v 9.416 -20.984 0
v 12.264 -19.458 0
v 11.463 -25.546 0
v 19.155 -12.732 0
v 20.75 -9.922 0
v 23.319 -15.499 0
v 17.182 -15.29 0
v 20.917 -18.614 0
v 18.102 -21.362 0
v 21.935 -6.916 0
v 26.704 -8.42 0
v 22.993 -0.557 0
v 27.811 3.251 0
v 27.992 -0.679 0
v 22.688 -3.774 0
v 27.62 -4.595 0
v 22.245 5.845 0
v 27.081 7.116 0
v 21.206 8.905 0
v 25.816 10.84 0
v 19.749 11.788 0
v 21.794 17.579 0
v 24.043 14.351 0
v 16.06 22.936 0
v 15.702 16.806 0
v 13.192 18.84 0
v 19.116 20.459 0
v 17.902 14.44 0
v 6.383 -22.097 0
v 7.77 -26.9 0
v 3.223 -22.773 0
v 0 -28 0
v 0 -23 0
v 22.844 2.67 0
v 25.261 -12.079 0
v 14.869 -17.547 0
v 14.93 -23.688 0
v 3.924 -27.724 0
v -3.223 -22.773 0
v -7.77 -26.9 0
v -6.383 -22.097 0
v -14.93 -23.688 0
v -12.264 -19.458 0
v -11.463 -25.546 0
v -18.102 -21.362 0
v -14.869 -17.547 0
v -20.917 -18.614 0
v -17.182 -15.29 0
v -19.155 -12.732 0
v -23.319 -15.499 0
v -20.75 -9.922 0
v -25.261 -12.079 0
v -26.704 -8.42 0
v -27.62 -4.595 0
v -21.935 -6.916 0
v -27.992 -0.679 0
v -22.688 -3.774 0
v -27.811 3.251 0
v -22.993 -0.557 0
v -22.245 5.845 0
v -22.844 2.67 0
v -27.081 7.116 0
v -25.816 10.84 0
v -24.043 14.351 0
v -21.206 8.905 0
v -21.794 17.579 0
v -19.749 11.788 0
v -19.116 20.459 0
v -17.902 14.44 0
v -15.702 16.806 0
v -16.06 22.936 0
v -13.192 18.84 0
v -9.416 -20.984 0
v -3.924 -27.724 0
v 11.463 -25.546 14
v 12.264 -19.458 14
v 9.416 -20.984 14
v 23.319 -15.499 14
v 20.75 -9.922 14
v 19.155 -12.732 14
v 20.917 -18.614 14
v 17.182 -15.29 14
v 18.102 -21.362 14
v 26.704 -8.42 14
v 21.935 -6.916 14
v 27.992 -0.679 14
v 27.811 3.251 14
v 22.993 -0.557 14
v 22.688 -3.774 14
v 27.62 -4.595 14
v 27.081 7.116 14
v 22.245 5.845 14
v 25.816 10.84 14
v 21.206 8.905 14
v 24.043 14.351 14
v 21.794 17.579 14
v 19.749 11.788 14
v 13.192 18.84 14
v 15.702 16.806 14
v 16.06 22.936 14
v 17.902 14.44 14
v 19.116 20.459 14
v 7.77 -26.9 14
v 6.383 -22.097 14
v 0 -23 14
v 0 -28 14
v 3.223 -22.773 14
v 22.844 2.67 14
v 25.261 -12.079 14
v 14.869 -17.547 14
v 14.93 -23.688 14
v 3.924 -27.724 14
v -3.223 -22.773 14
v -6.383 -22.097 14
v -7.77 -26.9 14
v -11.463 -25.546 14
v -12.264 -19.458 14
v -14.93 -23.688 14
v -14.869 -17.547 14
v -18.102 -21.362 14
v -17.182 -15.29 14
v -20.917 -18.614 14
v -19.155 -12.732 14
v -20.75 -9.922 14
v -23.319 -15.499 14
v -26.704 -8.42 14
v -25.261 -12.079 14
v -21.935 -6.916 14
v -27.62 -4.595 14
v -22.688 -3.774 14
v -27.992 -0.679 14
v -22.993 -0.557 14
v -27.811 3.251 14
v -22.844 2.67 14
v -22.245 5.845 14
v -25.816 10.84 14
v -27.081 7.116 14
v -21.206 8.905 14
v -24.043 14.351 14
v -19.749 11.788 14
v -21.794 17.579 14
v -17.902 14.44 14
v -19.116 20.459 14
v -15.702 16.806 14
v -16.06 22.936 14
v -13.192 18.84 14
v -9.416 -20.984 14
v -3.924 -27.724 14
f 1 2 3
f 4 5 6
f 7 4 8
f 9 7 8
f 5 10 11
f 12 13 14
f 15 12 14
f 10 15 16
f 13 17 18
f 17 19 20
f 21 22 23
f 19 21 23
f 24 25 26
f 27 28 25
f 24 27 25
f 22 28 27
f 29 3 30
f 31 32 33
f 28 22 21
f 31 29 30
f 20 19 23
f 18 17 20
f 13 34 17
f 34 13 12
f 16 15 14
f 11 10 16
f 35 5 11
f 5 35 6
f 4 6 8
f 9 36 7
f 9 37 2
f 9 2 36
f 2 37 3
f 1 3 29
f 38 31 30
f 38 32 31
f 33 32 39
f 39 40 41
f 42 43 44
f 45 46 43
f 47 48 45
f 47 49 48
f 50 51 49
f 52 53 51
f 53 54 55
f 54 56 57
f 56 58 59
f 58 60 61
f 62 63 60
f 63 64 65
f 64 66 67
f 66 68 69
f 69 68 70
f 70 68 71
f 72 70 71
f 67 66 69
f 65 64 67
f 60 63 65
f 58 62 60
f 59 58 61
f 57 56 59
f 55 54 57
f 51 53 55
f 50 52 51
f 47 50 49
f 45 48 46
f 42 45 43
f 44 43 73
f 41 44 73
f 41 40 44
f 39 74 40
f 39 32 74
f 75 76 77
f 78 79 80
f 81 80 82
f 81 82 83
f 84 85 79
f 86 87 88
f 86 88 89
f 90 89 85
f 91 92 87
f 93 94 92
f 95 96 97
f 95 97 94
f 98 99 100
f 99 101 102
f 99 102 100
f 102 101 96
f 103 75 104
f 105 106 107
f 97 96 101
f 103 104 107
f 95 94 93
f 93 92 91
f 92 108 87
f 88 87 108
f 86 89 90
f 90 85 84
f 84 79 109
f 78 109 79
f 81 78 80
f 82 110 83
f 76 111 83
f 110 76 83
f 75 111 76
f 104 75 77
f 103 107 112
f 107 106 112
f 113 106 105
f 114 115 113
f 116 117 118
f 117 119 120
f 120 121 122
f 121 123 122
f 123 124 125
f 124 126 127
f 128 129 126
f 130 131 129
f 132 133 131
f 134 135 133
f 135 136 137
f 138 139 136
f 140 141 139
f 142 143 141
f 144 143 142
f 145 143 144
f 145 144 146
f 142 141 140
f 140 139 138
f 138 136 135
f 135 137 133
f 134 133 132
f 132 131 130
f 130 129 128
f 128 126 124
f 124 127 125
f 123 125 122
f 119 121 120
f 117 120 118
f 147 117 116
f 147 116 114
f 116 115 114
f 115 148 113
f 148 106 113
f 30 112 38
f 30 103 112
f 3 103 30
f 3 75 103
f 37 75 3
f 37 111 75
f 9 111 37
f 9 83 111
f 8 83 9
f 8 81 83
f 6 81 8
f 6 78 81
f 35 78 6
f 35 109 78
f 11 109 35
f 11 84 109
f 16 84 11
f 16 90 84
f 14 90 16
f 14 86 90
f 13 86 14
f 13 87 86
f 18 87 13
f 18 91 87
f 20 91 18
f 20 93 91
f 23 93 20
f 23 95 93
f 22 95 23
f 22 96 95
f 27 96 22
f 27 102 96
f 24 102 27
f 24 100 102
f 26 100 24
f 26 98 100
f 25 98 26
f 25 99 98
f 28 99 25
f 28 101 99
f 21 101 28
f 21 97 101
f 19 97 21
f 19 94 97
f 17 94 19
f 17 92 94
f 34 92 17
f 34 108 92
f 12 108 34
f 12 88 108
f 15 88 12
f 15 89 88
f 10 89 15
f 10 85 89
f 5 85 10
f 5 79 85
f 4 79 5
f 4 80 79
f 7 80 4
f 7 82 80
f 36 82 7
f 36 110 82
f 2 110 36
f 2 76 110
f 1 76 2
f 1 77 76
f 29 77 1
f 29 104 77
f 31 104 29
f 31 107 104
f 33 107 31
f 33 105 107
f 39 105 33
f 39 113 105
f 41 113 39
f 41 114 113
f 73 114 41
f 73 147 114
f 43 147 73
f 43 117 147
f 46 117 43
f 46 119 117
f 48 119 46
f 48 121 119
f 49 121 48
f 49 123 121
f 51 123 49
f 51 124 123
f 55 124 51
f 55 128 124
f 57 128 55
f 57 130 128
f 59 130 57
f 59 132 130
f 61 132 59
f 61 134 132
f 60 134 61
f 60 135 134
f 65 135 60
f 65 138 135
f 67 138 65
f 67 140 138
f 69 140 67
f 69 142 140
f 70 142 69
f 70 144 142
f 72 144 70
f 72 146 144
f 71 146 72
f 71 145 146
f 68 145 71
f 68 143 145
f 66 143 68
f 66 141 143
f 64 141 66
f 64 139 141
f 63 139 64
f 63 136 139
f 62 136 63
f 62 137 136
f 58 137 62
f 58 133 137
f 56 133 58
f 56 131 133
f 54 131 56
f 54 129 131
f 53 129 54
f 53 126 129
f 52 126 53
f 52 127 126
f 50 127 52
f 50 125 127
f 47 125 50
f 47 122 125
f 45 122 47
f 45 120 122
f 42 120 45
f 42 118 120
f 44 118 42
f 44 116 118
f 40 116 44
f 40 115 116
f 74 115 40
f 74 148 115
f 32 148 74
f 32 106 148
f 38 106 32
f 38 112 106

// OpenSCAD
$fn = 32;

// ----------------------------------------------------------------------
// Spring clip: 56 mm outside, 5 mm band, 70 degree opening
// ----------------------------------------------------------------------

// --- parameters (mm) ---
outer_r = 28;             // clip outside radius
inner_r = 23;             // clip bore radius
band = 5;                 // band thickness
clip_w = 14;              // clip width
opening = 70;             // opening angle

clip_profile = [[-16.06, 22.936], [-19.116, 20.459], [-21.794, 17.579], [-24.043, 14.351], [-25.816, 10.84], [-27.081, 7.116], [-27.811, 3.251], [-27.992, -0.679], [-27.62, -4.595], [-26.704, -8.42], [-25.261, -12.079], [-23.319, -15.499], [-20.917, -18.614], [-18.102, -21.362], [-14.93, -23.688], [-11.463, -25.546], [-7.77, -26.9], [-3.924, -27.724], [0, -28], [3.924, -27.724], [7.77, -26.9], [11.463, -25.546], [14.93, -23.688], [18.102, -21.362], [20.917, -18.614], [23.319, -15.499], [25.261, -12.079], [26.704, -8.42], [27.62, -4.595], [27.992, -0.679], [27.811, 3.251], [27.081, 7.116], [25.816, 10.84], [24.043, 14.351], [21.794, 17.579], [19.116, 20.459], [16.06, 22.936], [13.192, 18.84], [15.702, 16.806], [17.902, 14.44], [19.749, 11.788], [21.206, 8.905], [22.245, 5.845], [22.844, 2.67], [22.993, -0.557], [22.688, -3.774], [21.935, -6.916], [20.75, -9.922], [19.155, -12.732], [17.182, -15.29], [14.869, -17.547], [12.264, -19.458], [9.416, -20.984], [6.383, -22.097], [3.223, -22.773], [0, -23], [-3.223, -22.773], [-6.383, -22.097], [-9.416, -20.984], [-12.264, -19.458], [-14.869, -17.547], [-17.182, -15.29], [-19.155, -12.732], [-20.75, -9.922], [-21.935, -6.916], [-22.688, -3.774], [-22.993, -0.557], [-22.844, 2.67], [-22.245, 5.845], [-21.206, 8.905], [-19.749, 11.788], [-17.902, 14.44], [-15.702, 16.806], [-13.192, 18.84]];

difference() {
  union() {
    linear_extrude(height = clip_w) polygon(clip_profile);
  }
}
